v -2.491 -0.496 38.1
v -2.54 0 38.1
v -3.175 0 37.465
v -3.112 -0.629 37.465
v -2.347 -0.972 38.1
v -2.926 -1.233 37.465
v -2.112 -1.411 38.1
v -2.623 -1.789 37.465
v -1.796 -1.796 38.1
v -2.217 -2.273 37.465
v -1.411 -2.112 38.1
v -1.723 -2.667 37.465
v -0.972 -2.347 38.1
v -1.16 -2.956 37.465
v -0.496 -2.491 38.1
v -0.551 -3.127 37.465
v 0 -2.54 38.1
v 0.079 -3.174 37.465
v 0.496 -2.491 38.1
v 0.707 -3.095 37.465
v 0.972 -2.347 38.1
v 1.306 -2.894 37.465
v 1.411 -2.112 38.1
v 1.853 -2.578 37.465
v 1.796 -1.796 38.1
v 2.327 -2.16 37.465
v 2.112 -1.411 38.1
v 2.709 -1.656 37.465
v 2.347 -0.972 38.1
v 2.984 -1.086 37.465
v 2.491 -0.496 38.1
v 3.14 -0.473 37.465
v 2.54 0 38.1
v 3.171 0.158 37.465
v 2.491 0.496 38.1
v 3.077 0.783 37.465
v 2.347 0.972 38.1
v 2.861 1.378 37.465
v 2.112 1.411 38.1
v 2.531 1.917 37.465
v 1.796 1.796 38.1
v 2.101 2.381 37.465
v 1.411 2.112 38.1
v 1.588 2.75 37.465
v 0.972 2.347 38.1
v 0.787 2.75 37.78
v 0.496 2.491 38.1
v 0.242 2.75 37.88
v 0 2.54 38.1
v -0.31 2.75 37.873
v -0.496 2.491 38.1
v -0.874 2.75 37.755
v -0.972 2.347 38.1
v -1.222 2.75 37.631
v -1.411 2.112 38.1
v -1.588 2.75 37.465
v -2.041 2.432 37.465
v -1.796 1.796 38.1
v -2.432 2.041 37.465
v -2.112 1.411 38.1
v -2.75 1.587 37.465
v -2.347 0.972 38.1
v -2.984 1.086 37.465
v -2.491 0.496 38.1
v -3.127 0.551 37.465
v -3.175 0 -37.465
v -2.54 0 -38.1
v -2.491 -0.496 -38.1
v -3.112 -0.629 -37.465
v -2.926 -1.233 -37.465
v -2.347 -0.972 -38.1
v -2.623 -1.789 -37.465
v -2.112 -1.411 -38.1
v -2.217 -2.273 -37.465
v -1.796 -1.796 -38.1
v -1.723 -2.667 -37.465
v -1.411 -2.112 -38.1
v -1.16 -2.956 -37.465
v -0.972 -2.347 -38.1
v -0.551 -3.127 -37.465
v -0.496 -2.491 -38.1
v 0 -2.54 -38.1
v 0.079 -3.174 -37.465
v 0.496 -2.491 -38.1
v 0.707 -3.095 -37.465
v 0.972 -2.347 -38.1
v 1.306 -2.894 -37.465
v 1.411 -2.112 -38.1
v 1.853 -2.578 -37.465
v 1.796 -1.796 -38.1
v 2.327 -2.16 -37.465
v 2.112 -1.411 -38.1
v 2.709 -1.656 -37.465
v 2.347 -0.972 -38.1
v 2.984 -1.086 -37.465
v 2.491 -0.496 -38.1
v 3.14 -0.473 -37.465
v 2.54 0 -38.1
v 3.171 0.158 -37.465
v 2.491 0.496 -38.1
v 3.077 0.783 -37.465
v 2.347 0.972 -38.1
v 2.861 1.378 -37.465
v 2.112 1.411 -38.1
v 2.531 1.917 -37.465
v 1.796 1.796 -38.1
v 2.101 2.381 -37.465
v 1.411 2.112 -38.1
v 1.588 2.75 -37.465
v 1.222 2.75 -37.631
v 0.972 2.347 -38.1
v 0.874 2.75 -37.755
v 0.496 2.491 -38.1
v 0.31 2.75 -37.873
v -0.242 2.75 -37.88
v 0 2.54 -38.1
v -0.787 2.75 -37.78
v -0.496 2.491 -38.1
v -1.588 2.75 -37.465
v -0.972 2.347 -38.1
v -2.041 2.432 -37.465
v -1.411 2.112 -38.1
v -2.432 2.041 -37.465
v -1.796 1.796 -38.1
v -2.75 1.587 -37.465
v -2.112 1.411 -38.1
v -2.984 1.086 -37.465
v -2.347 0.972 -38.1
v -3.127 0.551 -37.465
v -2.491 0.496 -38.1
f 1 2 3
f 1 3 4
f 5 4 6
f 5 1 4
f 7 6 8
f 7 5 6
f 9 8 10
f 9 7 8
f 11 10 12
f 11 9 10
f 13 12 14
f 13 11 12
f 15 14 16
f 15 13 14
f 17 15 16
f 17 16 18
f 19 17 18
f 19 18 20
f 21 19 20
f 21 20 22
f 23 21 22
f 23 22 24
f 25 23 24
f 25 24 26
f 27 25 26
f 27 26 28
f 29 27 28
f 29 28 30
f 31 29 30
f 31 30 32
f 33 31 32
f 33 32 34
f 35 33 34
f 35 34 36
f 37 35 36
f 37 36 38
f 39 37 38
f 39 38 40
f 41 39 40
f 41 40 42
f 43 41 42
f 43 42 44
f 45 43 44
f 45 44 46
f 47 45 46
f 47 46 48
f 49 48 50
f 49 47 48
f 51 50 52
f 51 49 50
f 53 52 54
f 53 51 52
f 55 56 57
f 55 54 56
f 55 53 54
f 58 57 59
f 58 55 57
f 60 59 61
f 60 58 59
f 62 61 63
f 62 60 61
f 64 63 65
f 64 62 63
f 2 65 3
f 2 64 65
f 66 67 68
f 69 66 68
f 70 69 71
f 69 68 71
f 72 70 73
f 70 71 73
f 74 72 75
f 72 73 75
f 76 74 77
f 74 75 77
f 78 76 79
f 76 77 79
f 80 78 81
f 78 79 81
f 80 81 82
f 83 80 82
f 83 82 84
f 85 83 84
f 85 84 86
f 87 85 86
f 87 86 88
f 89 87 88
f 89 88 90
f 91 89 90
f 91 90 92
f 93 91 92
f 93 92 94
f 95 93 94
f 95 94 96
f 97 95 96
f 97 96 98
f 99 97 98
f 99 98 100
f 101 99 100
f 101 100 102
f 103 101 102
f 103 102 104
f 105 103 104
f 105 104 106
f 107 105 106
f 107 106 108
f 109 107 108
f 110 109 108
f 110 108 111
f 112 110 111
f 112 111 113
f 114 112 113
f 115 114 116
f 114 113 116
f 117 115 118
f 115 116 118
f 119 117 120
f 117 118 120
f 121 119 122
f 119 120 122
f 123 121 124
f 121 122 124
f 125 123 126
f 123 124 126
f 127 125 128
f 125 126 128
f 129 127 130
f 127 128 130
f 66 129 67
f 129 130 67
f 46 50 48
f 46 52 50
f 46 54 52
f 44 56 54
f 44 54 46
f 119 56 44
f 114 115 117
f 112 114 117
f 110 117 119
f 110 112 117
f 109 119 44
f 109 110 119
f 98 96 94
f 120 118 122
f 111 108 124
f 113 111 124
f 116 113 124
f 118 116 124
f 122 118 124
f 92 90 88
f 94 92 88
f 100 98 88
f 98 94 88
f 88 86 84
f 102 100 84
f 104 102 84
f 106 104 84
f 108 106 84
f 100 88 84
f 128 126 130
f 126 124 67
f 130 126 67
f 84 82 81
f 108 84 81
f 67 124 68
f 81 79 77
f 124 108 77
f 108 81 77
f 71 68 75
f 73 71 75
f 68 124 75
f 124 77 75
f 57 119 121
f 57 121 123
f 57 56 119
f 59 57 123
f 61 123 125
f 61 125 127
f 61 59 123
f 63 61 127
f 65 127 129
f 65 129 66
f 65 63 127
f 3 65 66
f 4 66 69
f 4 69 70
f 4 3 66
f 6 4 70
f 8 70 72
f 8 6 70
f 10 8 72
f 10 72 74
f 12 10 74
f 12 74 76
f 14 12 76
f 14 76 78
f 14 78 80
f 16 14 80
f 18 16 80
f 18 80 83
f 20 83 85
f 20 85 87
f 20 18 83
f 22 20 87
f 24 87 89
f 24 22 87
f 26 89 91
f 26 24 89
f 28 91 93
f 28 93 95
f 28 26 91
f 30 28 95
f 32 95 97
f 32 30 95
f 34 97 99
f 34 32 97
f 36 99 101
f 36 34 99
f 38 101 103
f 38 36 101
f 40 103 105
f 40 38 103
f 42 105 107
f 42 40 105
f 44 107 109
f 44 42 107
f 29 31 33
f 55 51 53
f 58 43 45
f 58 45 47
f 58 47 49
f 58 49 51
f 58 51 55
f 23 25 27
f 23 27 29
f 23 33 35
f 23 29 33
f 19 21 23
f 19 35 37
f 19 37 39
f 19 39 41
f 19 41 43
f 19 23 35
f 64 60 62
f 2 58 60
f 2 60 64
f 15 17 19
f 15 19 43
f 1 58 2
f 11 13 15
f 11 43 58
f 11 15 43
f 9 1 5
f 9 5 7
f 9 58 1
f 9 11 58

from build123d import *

# Parameters (mm, degrees)
SKETCH1_R           = 3.175
EXTRUDE1_DEPTH      = 38.1
CHAMFER1_SIZE       = 0.635
EXTRUDE7_DEPTH      = 39.363670966
EXTRUDE7_DEPTH_BACK = 39.363670966


with BuildPart() as part:
    # Sketch1 → Extrude1 (new, symmetric)
    with BuildSketch(Plane.XY):
        with Locations(Location((0, 0, 0), (0, 0, 180))):
            Circle(SKETCH1_R)
    extrude(amount=EXTRUDE1_DEPTH, both=True)

    # Chamfer1
    chamfer1_edges = [part.edges().sort_by_distance(p)[0] for p in [
        (3.175, 0, -38.1),
        (3.175, 0, 38.1),
    ]]
    chamfer(chamfer1_edges, length=CHAMFER1_SIZE)

    # Sketch13 → Extrude7 (cut, two sides: drawn at the far end of the back side and taken through both)
    with BuildSketch(Plane.XY.offset(-EXTRUDE7_DEPTH_BACK)):
        with BuildLine():
            Line((-1.5875, 2.749630657), (1.5875, 2.749630657))
            ThreePointArc((1.5875, 2.749630657), (0, 3.175), (-1.5875, 2.749630657))
        make_face()
    extrude(amount=EXTRUDE7_DEPTH + EXTRUDE7_DEPTH_BACK, mode=Mode.SUBTRACT)


solid = part.part
